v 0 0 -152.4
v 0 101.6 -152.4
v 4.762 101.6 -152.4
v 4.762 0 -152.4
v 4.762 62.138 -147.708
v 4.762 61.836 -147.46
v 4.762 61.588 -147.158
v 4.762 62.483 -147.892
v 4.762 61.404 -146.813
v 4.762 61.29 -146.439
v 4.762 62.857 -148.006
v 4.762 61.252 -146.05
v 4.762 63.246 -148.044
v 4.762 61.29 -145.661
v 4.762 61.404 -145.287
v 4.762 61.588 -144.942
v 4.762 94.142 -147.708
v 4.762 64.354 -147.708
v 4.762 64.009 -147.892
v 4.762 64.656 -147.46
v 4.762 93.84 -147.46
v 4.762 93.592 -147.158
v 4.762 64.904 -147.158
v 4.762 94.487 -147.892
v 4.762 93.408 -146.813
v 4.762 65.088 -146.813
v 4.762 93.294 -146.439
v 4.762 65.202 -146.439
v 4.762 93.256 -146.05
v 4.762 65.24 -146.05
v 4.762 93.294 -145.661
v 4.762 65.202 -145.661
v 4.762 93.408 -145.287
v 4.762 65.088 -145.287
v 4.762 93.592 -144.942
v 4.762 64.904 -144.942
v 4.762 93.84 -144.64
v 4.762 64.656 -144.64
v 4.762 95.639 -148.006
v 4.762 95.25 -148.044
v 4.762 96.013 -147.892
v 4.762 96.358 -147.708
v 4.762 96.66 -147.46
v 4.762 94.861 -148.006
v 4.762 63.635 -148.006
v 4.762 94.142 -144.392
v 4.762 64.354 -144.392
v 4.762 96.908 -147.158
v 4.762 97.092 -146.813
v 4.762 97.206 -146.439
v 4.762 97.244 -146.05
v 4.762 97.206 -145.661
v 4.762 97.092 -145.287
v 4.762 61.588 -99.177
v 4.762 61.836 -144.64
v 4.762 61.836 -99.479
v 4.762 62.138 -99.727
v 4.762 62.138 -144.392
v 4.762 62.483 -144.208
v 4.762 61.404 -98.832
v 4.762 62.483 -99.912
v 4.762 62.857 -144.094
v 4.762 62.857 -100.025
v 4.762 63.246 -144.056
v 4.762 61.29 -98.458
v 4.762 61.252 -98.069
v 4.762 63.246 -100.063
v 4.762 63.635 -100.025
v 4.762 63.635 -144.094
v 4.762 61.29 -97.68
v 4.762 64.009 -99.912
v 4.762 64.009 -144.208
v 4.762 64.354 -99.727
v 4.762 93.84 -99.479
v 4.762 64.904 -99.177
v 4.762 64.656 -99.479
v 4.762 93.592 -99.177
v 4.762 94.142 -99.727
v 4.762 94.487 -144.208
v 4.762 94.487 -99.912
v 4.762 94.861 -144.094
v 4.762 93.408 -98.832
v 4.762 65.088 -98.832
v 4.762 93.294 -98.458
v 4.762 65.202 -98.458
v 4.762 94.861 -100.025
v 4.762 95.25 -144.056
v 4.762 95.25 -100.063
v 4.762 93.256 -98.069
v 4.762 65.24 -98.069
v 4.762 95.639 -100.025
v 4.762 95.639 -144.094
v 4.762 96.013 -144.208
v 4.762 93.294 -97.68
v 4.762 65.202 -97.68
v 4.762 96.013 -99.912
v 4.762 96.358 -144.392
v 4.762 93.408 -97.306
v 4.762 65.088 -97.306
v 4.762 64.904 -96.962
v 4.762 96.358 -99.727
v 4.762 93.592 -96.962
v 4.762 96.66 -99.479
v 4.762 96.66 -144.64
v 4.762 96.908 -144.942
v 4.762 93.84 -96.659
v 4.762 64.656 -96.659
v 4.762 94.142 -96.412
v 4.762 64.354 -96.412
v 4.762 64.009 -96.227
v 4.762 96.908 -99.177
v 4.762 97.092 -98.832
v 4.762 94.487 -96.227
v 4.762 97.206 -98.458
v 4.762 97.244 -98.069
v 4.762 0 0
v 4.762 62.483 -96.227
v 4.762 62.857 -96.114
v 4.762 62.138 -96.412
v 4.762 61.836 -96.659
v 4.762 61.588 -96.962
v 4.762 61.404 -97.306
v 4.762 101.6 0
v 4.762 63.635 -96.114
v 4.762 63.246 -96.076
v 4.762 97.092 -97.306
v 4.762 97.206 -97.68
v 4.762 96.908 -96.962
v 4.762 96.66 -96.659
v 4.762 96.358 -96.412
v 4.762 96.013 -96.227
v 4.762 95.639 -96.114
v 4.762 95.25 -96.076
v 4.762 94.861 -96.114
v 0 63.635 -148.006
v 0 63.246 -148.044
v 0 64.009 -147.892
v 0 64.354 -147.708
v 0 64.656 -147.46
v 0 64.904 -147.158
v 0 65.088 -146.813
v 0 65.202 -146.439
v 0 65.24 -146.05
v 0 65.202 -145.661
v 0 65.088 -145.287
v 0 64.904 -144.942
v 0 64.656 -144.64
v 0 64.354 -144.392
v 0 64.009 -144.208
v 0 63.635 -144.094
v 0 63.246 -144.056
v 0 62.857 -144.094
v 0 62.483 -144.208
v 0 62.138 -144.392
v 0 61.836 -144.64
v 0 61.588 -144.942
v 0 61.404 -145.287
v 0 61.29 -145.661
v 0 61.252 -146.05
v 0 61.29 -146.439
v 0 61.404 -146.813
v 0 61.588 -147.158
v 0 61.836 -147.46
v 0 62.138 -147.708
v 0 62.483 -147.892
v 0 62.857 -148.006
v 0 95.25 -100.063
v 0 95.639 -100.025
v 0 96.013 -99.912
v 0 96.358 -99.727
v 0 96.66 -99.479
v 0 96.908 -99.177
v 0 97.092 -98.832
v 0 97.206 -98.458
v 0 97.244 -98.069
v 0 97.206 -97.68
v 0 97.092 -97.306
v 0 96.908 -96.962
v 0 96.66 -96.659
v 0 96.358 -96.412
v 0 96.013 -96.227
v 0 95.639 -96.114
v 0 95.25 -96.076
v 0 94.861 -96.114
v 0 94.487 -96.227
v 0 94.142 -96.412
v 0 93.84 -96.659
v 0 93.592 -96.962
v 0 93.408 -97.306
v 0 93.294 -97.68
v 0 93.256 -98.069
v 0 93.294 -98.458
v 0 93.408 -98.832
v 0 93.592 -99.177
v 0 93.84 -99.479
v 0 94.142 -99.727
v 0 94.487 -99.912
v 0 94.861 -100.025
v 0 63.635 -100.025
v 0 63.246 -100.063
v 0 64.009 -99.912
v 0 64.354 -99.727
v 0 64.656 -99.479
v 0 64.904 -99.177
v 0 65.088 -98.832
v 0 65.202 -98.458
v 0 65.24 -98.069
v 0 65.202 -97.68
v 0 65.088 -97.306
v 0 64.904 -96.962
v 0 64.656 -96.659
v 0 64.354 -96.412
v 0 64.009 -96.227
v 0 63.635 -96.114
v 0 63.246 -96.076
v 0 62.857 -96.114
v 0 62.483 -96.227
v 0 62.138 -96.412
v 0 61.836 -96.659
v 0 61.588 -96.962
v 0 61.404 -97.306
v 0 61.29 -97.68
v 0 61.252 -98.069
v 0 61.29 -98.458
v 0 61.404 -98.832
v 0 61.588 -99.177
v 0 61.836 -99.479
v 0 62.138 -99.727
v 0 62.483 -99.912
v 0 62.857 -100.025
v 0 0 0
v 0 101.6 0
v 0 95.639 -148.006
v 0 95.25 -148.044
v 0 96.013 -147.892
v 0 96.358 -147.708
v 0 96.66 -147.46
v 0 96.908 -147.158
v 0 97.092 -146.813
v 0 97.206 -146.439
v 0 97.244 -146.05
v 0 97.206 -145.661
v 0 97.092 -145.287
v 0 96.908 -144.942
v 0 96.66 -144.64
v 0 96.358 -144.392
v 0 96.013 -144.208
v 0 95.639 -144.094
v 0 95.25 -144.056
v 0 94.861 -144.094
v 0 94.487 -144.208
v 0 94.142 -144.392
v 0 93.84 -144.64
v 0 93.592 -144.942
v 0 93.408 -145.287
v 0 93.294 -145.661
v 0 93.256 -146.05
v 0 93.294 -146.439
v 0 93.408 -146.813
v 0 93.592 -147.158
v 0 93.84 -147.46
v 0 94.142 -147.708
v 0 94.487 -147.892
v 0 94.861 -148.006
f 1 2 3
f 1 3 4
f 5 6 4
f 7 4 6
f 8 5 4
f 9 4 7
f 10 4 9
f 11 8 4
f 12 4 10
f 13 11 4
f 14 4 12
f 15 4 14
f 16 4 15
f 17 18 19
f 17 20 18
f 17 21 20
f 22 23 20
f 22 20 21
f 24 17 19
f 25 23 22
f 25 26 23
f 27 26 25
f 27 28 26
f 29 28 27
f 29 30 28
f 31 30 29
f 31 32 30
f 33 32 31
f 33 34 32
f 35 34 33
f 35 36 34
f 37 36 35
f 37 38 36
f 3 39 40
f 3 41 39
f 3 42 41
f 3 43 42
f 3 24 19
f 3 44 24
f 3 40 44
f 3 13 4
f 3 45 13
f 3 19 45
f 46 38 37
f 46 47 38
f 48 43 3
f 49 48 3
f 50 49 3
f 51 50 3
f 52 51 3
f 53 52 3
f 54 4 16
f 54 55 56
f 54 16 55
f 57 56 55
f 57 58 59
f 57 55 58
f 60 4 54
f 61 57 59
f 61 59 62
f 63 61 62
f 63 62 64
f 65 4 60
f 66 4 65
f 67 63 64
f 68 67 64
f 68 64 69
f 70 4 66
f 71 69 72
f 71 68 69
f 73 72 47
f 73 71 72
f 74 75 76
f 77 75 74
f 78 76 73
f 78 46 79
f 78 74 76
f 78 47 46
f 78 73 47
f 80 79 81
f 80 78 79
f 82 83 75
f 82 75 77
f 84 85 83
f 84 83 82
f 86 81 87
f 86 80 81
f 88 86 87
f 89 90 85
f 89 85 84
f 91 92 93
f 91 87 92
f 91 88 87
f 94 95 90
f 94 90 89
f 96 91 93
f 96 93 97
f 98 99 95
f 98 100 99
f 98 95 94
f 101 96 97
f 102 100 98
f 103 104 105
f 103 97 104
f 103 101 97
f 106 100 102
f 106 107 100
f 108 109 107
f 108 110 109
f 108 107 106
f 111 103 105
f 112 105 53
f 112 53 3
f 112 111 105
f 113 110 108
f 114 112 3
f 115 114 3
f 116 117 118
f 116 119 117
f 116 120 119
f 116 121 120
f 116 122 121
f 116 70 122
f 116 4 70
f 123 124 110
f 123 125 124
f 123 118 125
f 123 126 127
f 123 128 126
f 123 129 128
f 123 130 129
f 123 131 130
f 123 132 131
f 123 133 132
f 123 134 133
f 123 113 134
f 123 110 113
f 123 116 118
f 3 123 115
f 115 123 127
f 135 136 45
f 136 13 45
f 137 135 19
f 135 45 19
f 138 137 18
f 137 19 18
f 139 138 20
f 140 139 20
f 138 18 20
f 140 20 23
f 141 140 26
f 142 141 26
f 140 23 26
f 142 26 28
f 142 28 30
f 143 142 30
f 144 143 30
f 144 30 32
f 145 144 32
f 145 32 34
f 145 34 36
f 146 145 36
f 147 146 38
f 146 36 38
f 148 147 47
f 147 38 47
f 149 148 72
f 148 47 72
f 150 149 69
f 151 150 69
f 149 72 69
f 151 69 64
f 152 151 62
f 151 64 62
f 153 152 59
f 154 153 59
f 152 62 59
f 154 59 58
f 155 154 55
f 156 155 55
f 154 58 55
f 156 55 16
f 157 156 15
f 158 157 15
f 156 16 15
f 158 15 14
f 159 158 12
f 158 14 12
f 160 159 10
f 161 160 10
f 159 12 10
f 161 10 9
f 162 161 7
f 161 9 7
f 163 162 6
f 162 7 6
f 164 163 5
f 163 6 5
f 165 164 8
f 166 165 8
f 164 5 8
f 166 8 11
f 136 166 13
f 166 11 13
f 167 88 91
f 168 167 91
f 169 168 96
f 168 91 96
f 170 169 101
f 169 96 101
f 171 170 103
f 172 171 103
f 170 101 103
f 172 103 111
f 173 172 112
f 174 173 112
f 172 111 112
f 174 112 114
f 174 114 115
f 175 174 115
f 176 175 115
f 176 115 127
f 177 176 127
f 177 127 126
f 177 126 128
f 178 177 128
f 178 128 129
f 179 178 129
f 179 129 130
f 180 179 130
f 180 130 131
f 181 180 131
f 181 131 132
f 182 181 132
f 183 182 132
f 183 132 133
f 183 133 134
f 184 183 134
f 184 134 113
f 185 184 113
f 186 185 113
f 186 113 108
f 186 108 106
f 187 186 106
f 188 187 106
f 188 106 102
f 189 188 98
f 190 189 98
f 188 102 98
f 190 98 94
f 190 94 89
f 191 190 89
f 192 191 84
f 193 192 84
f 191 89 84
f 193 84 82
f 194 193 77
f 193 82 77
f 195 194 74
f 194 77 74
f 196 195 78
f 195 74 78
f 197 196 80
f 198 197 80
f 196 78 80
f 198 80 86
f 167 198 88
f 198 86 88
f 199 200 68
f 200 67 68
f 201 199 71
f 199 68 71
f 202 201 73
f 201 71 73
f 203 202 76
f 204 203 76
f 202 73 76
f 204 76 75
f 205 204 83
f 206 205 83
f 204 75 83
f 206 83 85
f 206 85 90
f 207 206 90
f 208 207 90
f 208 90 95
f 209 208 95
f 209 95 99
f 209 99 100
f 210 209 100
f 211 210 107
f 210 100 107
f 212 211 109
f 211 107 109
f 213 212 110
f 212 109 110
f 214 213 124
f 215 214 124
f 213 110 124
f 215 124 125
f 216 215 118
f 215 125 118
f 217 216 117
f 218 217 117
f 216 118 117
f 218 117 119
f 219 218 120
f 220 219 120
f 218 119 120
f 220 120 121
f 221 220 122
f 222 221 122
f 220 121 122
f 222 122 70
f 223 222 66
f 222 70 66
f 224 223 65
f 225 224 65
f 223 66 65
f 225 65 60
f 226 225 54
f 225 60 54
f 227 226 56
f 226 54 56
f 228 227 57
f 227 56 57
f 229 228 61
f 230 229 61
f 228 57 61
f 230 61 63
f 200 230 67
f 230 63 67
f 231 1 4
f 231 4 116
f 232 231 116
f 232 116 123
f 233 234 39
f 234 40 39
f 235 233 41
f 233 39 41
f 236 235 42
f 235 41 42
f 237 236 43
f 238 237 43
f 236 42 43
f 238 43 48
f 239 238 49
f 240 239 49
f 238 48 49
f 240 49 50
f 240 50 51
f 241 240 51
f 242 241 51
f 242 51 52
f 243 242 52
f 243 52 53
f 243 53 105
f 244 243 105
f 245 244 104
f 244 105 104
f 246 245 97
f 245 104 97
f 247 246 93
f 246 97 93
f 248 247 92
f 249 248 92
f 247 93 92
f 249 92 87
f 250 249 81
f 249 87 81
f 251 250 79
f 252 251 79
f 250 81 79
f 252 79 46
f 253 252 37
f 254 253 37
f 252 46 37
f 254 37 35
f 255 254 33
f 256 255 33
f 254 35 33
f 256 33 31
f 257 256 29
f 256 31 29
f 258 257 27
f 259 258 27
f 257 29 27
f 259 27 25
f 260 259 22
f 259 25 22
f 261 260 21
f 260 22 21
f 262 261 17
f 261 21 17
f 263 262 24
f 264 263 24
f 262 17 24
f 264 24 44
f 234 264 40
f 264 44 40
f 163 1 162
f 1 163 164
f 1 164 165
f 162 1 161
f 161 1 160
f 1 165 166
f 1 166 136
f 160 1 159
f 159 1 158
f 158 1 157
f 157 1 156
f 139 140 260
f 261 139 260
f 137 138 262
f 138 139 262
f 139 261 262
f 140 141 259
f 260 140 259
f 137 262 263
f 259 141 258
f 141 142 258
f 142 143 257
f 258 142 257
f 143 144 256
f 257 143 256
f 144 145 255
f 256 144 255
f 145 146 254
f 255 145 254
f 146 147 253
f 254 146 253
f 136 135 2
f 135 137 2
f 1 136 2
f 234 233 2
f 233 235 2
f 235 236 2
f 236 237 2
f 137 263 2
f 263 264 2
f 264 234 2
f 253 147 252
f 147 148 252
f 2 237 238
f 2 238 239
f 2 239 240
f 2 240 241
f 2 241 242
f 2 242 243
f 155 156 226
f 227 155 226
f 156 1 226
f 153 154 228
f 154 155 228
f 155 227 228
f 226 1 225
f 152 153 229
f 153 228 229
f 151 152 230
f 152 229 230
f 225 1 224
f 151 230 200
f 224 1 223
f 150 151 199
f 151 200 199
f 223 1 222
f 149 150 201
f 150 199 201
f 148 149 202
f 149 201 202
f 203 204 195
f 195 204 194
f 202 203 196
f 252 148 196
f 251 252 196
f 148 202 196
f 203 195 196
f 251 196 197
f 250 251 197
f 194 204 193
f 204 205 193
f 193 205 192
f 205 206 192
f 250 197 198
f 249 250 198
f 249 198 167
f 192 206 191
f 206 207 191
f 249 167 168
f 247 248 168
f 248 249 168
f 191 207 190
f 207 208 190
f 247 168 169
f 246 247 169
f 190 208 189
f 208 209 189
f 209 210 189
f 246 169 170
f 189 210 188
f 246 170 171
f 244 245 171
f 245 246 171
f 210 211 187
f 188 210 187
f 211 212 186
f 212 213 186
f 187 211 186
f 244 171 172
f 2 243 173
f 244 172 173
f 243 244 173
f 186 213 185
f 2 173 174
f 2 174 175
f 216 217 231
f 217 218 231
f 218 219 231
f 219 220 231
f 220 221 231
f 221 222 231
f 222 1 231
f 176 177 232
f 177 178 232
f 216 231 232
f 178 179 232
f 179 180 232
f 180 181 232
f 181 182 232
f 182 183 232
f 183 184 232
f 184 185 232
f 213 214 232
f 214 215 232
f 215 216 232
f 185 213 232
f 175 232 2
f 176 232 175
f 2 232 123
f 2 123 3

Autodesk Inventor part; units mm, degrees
ref_plane "YZ Plane" through (0, 0, 0) normal (1, 0, 0) x (0, 1, 0)
ref_plane "XZ Plane" through (0, 0, 0) normal (0, 1, 0) x (-1, 0, 0)
ref_plane "XY Plane" through (0, 0, 0) normal (0, 0, 1) x (1, 0, 0)
sketch "Sketch1" plane through (0, 0, 0) normal (1, 0, 0) x (0, 1, 0)
  line L0 (0, 0) -> (101.6, 0)
  line L1 (101.6, 0) -> (101.6, -152.4)
  line L2 (101.6, -152.4) -> (0, -152.4)
  line L3 (0, -152.4) -> (0, 0)
  dimension "d0" = 101.6
  dimension "d1" = 152.4
extrude "Extrusion1" add sketch "Sketch1" along normal blind 4.7625
sketch "Sketch3" plane through (4.7625, 0, 0) normal (1, 0, 0) x (0, 0, -1)
  circle A0 centre (146.05, 63.246) radius 1.9939
  circle A1 centre (146.05, 95.25) radius 1.9939
  line L0 (152.4, 0) -> (152.4, 101.6) projected
  line L1 (152.4, 101.6) -> (0, 101.6) projected
  point P0 (0, 0)
  dimension "d4" = 32.004
  dimension "d5" = 3.9878
  dimension "d6" = 3.9878
  dimension "d7" = 6.35
  dimension "d8" = 6.35
  dimension "d12" = 6.35
extrude "Extrusion2" cut sketch "Sketch3" against normal through all
sketch "Sketch4" plane through (4.7625, 0, 0) normal (1, 0, 0) x (0, 0, -1)
  circle A0 centre (98.0694, 95.25) radius 1.9939
  circle A1 centre (98.0694, 63.246) radius 1.9939
  circle A2 centre (146.05, 95.25) radius 1.9939 projected
  circle A3 centre (146.05, 63.246) radius 1.9939 projected
  point P0 (0, 0)
  dimension "d13" = 47.9806
  dimension "d14" = 47.9806
  dimension "d15" = 3.9878
  dimension "d16" = 3.9878
extrude "Extrusion3" cut sketch "Sketch4" against normal through all contours A0 | A1
properties part number "base plate"
